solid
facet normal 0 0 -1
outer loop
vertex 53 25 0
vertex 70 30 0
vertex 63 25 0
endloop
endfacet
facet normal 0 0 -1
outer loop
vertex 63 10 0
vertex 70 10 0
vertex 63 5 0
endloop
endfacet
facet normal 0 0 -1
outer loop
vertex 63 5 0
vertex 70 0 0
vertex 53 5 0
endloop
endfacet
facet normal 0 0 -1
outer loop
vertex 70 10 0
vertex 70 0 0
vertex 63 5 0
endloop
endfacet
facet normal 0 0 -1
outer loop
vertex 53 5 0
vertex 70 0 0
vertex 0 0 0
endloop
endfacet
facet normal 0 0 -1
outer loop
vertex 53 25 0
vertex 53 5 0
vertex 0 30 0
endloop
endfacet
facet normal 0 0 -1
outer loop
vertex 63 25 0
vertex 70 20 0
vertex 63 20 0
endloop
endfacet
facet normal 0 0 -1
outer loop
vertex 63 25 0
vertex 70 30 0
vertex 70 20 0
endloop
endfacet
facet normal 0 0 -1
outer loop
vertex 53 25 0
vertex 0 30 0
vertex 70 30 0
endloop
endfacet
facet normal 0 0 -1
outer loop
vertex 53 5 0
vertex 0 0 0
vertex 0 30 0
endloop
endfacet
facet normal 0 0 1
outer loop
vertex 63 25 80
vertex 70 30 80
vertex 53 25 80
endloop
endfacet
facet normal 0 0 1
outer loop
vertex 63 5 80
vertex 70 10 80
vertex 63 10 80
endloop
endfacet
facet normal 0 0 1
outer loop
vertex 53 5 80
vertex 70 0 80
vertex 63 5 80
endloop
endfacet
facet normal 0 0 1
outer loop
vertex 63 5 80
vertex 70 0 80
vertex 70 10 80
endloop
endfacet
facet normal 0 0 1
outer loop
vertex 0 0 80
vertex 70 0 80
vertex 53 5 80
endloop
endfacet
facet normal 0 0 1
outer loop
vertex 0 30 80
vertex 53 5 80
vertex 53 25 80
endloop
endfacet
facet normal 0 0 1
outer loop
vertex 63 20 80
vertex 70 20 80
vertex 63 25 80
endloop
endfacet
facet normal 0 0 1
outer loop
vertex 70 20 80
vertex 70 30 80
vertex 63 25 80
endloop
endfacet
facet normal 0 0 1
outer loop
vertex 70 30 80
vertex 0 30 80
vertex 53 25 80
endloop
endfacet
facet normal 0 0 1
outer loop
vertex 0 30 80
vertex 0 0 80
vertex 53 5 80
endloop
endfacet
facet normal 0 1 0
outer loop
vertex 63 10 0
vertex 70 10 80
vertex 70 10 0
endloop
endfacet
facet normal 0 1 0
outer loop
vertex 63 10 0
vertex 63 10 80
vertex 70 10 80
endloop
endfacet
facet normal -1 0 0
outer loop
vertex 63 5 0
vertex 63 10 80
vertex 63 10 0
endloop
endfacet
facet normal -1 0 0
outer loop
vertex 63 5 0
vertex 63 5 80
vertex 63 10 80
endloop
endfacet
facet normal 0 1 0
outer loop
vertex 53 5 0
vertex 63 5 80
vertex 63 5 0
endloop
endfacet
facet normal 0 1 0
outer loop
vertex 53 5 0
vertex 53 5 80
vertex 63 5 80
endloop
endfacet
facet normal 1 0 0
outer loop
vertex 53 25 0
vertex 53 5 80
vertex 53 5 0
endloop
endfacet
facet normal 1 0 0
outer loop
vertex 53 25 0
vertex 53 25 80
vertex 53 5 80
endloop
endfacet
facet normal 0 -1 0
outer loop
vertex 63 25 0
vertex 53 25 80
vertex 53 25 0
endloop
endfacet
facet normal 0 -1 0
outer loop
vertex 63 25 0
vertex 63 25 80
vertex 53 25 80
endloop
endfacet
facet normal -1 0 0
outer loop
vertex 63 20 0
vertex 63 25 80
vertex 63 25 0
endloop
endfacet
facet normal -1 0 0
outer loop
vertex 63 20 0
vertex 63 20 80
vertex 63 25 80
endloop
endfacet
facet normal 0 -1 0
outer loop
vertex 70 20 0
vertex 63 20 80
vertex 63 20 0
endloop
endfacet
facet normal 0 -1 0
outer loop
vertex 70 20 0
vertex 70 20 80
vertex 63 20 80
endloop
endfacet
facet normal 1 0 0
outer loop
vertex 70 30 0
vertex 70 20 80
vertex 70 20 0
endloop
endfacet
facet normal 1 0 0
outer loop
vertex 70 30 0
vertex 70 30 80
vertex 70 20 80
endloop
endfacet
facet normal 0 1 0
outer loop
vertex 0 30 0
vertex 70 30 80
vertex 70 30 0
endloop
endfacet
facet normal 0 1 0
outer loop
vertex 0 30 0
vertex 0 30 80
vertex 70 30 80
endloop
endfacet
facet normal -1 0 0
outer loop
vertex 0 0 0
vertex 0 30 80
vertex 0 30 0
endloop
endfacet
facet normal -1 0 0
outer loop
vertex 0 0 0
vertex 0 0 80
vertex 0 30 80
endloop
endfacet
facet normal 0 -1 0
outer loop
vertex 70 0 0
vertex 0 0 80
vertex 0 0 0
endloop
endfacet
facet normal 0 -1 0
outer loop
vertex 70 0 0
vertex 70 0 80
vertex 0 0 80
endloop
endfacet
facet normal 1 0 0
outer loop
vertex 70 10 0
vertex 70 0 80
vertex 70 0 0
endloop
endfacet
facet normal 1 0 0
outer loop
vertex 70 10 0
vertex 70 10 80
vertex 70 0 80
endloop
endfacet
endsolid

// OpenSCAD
$fn = 32;

// ----------------------------------------------------------------------
// T-slot rail: 70 x 30 mm section, 80 mm long
// ----------------------------------------------------------------------

// --- parameters (mm) ---
profile_height = 80;      // extrusion height
profile_points = 12;      // points of the closed outline

profile = [[0, 0], [70, 0], [70, 10], [63, 10], [63, 5], [53, 5], [53, 25], [63, 25], [63, 20], [70, 20], [70, 30], [0, 30]];  // single closed polygon, 12 points, counter clockwise

// --- the one profile operation ---
linear_extrude(height = profile_height) polygon(points = profile);
